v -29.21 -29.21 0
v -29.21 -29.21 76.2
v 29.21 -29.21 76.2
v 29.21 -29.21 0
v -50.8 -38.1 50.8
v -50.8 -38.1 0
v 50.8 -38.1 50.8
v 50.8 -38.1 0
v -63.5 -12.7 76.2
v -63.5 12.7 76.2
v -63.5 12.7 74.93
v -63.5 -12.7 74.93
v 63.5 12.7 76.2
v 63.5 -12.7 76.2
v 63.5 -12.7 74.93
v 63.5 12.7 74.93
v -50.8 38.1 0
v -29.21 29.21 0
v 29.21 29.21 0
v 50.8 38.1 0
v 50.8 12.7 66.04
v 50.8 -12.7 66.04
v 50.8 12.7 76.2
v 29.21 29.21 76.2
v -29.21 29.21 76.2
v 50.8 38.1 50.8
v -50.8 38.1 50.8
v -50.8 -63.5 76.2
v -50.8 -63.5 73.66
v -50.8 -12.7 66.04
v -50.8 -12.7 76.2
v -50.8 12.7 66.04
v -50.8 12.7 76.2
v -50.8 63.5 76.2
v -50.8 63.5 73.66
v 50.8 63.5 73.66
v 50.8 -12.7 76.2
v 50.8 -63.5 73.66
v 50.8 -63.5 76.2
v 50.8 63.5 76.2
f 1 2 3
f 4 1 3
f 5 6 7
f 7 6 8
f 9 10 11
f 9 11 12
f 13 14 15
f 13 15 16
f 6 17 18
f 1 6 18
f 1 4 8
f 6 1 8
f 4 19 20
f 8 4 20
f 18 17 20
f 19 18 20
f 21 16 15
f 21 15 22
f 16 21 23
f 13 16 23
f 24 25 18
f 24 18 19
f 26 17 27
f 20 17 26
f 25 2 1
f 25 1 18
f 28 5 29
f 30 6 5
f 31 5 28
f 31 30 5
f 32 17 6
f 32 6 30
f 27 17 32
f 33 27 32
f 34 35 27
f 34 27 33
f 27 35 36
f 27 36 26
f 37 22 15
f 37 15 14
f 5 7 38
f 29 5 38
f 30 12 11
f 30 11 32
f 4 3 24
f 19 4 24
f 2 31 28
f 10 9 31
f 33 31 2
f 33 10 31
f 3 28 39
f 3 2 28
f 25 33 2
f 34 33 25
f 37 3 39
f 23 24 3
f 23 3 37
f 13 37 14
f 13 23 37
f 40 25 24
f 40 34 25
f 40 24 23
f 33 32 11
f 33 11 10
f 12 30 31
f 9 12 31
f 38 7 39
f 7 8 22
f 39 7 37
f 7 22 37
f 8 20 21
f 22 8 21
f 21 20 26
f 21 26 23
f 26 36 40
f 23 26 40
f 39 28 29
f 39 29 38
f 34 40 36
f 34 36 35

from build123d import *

# Parameters (mm, degrees)
F0_W      = 101.6
F0_H      = 76.2
F1_DEPTH  = 76.2
F2_W      = 58.42
F2_H      = 58.42
F3_DEPTH  = 228.6
F4_W      = 101.6
F4_H      = 25.4
F5_DEPTH  = 25.4
F6_W      = 101.6
F6_H      = 25.4
F7_DEPTH  = 25.4
F9_DEPTH  = 228.6
F10_W     = 25.4
F10_H     = 10.16
F11_DEPTH = 12.7
F13_DEPTH = 228.6
F14_W     = 25.4
F14_H     = 10.16
F15_DEPTH = 12.7
F17_DEPTH = 228.6


with BuildPart() as f1:
    # F0 (on Top) → F1 (new body)
    with BuildSketch(Plane.XY):
        Rectangle(F0_W, F0_H)
    extrude(amount=F1_DEPTH)

    # F2 (on face) → F3 (cut)
    with BuildSketch(Plane.XY.offset(76.2)):
        Rectangle(F2_W, F2_H)
    extrude(amount=-F3_DEPTH, mode=Mode.SUBTRACT)

    # F4 (on face) → F5 (join)
    with BuildSketch(Plane(origin=(0, 38.1, 0), x_dir=(-1, 0, 0), z_dir=(0, 1, 0))):
        with Locations((0, 63.5)):
            Rectangle(F4_W, F4_H)
    extrude(amount=F5_DEPTH)

    # F6 (on face) → F7 (join)
    with BuildSketch(Plane.XZ.offset(38.1)):
        with Locations((0, 63.5)):
            Rectangle(F6_W, F6_H)
    extrude(amount=F7_DEPTH)

    # F8 (on face) → F9 (cut)
    with BuildSketch(Plane.YZ.offset(50.8)):
        Polygon((-38.1, 50.8), (-63.5, 73.66), (-63.5, 50.8), align=None)
        Polygon((63.5, 50.8), (63.5, 73.66), (38.1, 50.8), align=None)
    extrude(amount=-F9_DEPTH, mode=Mode.SUBTRACT)

    # F10 (on face) → F11 (join)
    with BuildSketch(Plane.YZ.offset(50.8)):
        with Locations((0, 71.12)):
            Rectangle(F10_W, F10_H)
    extrude(amount=F11_DEPTH)

    # F12 (on face) → F13 (cut)
    with BuildSketch(Plane.XZ.offset(12.7)):
        Polygon((63.5, 66.04), (63.5, 74.93), (50.8, 66.04), align=None)
    extrude(amount=-F13_DEPTH, mode=Mode.SUBTRACT)

    # F14 (on face) → F15 (join)
    with BuildSketch(Plane(origin=(-50.8, 0, 0), x_dir=(0, -1, 0), z_dir=(-1, 0, 0))):
        with Locations((0, 71.12)):
            Rectangle(F14_W, F14_H)
    extrude(amount=F15_DEPTH)

    # F16 (on face) → F17 (cut)
    with BuildSketch(Plane(origin=(0, 12.7, 0), x_dir=(-1, 0, 0), z_dir=(0, 1, 0))):
        Polygon((63.5, 66.04), (63.5, 74.93), (50.8, 66.04), align=None)
    extrude(amount=-F17_DEPTH, mode=Mode.SUBTRACT)


solid = f1.part
